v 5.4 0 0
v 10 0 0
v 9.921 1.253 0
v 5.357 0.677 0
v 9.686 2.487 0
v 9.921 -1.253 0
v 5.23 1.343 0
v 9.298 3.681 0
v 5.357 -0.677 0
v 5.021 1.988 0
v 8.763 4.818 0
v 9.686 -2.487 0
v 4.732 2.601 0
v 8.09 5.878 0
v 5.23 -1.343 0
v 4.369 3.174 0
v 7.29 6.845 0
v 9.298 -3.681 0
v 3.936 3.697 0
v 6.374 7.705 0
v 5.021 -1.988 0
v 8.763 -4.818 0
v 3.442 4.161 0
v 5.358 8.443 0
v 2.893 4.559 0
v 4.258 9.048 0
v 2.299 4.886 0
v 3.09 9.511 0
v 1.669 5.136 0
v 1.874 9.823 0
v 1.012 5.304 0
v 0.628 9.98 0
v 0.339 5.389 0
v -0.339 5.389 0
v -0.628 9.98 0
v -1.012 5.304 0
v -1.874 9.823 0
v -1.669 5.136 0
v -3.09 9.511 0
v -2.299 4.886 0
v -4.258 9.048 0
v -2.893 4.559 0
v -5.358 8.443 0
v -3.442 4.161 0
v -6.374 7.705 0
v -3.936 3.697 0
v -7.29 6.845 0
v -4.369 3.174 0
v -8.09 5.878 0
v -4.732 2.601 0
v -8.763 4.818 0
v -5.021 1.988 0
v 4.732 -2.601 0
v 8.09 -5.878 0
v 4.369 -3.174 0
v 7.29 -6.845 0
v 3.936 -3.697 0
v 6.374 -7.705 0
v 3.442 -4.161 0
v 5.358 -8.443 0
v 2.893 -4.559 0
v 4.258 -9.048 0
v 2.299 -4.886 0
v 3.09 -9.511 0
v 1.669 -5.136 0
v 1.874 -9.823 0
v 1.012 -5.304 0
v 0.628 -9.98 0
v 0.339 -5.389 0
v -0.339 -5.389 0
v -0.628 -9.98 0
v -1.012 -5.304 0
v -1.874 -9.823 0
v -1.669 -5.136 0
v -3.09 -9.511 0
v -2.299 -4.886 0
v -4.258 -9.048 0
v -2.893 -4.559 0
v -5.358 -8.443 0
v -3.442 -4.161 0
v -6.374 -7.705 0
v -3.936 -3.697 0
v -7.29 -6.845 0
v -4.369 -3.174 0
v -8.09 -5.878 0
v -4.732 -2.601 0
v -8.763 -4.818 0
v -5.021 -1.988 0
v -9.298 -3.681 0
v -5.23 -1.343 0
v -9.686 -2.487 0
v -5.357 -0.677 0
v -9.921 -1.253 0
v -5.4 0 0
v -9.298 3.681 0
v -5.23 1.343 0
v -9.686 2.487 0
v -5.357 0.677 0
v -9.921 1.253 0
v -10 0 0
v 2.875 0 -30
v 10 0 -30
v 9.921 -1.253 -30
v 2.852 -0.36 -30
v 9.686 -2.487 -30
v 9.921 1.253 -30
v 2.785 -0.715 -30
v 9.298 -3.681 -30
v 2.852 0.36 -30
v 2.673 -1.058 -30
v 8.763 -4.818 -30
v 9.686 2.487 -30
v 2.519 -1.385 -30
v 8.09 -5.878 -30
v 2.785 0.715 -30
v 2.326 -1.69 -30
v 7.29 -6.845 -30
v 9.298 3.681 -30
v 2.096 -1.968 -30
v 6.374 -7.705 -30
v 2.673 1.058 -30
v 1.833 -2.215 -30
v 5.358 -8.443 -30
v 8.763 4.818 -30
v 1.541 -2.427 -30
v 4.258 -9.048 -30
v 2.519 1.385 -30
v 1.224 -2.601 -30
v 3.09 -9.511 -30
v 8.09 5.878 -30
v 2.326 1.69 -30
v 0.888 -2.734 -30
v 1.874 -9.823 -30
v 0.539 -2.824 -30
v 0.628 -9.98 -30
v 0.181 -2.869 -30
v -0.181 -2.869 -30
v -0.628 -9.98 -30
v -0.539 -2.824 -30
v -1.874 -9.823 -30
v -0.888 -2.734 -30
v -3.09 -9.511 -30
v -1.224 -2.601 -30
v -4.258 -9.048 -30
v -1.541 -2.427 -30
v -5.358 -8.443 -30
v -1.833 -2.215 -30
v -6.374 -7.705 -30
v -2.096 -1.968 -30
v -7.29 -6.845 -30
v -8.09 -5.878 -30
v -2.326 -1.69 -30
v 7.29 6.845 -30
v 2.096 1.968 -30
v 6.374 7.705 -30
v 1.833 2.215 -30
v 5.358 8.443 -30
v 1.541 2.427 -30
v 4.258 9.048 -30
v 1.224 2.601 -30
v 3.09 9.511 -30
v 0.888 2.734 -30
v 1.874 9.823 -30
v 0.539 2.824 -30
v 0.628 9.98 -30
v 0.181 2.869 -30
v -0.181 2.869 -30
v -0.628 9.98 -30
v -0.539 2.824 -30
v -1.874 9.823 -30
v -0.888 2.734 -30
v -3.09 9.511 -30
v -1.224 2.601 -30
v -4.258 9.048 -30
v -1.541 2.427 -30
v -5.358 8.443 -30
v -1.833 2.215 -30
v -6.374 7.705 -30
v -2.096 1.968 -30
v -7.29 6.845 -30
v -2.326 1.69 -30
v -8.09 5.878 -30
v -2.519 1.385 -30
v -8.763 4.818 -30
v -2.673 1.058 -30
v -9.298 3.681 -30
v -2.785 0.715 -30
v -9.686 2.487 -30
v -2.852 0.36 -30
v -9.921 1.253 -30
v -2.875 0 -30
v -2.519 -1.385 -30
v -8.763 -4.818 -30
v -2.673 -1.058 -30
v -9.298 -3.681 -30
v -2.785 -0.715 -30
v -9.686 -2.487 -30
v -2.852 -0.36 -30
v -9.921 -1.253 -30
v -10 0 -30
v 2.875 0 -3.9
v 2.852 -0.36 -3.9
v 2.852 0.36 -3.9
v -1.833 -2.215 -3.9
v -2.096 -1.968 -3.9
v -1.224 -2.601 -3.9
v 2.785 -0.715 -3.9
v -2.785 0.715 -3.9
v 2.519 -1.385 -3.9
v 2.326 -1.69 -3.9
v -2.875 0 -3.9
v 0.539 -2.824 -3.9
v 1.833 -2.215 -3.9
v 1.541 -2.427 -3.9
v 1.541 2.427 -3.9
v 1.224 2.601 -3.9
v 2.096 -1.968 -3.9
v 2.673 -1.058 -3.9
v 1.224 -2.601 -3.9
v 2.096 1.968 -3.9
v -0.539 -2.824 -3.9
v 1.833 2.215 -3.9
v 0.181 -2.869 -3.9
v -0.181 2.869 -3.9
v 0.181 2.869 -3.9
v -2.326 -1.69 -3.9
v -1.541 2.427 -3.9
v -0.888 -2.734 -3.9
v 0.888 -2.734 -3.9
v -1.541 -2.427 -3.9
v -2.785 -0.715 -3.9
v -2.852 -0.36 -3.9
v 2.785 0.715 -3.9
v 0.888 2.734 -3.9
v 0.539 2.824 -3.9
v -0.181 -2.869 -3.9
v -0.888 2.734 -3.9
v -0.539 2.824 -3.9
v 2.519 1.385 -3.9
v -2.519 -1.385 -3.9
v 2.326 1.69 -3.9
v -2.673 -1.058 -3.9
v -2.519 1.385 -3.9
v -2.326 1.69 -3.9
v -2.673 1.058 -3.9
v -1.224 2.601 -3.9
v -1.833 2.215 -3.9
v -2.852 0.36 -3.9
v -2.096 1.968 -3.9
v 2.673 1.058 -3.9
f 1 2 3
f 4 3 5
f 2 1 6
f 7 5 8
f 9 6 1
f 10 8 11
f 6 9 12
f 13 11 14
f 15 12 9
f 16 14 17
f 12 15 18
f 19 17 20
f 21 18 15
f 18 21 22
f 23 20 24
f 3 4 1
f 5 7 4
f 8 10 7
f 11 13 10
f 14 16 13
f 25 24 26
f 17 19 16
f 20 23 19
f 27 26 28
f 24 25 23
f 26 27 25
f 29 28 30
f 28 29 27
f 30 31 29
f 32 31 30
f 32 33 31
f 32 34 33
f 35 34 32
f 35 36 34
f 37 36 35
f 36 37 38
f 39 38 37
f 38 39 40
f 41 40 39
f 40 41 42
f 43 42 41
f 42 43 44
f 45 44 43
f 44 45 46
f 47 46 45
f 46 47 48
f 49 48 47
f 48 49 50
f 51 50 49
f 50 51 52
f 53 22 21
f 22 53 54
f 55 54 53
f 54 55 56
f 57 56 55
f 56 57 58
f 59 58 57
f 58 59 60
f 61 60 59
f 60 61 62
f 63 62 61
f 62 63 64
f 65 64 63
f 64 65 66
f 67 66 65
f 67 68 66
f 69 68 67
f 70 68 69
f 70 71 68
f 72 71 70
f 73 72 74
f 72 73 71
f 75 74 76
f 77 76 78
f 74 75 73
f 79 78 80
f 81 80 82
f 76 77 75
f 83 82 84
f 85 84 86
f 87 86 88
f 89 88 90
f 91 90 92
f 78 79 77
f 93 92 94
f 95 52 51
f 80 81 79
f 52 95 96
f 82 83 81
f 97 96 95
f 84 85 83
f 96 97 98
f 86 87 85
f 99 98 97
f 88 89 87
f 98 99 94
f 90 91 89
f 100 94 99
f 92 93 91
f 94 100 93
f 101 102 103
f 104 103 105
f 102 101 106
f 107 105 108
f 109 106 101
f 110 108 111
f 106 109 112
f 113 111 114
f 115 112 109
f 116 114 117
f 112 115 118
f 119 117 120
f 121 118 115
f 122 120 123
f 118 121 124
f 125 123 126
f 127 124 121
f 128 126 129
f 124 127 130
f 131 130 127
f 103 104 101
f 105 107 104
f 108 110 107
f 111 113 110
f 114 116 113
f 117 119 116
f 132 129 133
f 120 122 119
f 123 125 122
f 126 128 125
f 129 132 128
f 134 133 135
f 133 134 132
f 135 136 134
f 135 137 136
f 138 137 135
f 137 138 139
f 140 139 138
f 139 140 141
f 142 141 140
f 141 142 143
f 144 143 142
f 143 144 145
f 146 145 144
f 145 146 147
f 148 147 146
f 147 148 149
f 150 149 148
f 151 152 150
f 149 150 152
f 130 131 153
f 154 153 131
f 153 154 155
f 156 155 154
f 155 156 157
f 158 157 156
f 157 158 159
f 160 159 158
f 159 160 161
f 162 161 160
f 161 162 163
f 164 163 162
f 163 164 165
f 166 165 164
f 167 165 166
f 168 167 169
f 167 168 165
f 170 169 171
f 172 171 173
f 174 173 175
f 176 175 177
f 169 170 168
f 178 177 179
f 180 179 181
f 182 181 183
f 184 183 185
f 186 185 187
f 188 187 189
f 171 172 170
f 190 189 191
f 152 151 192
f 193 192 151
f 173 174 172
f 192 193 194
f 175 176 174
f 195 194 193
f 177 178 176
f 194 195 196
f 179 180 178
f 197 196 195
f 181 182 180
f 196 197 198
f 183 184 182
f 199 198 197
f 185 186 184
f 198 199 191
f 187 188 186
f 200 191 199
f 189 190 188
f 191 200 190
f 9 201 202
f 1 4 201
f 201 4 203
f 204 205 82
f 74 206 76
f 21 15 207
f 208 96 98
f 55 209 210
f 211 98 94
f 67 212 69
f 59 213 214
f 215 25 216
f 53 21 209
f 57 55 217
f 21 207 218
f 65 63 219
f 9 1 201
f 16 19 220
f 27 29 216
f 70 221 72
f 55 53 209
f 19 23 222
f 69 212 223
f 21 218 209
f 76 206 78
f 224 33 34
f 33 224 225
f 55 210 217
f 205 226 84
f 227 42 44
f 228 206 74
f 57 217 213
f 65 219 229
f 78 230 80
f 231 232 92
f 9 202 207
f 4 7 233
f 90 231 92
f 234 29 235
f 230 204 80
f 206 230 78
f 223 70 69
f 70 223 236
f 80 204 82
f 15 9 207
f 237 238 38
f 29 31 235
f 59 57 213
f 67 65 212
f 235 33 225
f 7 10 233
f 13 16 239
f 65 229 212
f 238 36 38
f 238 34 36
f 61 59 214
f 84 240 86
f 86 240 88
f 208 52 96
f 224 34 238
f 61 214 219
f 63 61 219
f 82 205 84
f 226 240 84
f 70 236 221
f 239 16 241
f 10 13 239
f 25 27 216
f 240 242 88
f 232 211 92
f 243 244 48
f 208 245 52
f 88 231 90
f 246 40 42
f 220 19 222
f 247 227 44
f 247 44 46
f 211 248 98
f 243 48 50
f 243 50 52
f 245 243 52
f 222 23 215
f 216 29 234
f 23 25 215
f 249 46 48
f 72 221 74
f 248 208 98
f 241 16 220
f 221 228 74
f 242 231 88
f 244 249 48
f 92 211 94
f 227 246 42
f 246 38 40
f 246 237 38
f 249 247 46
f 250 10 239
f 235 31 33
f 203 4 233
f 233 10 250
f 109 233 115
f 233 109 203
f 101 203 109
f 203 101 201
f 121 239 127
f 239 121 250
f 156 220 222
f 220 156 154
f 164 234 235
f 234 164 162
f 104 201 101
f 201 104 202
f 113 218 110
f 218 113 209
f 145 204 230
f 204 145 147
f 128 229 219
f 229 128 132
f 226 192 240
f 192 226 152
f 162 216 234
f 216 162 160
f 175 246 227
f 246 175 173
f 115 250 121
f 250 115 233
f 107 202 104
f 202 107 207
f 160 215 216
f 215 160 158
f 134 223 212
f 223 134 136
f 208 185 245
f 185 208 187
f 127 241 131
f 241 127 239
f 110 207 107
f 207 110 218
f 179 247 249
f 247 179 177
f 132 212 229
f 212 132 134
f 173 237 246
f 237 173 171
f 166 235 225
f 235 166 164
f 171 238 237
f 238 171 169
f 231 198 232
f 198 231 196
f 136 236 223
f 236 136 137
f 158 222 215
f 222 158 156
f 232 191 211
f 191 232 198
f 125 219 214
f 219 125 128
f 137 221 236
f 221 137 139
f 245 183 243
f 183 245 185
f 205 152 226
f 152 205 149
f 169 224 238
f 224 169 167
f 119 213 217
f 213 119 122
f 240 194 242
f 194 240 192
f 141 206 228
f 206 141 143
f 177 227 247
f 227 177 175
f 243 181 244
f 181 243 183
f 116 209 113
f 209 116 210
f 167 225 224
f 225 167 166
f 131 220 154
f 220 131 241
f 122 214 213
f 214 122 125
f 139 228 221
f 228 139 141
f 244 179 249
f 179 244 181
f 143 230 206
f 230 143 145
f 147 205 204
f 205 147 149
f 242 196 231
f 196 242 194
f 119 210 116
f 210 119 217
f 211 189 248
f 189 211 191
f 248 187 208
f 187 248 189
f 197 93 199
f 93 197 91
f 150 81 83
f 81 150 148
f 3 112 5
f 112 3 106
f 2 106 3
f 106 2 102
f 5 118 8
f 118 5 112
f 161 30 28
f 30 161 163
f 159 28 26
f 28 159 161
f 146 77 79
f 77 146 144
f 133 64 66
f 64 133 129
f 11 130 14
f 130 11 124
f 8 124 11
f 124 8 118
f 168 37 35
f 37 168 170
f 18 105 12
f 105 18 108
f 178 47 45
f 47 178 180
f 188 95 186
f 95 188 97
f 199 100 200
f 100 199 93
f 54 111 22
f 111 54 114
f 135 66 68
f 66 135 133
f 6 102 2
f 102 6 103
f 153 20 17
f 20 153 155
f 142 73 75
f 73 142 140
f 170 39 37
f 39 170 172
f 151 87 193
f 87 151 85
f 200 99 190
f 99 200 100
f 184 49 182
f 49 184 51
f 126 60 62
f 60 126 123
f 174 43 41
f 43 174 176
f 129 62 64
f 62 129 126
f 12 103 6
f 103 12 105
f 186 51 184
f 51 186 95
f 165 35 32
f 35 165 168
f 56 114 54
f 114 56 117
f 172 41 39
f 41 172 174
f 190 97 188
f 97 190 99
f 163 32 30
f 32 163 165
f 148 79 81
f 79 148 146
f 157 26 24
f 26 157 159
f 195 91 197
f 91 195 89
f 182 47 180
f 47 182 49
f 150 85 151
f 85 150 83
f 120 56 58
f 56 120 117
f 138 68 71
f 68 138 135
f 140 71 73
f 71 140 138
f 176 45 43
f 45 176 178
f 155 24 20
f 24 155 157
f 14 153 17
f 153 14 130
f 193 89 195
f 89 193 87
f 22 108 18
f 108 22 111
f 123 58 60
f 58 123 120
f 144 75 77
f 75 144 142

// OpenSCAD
$fn = 50;


difference() {
	union() {
		translate(v = [0, 0, -30.0000000000]) {
			cylinder(h = 30, r = 10.0000000000);
		}
		cylinder(h = 0, r = 16.0000000000);
	}
	union() {
		translate(v = [0, 0, 0]) {
			rotate(a = [0, 0, 0]) {
				difference() {
					union() {
						#translate(v = [0, 0, -30.0000000000]) {
							cylinder(h = 30, r = 2.6000000000);
						}
						#translate(v = [0, 0, -3.9000000000]) {
							cylinder(h = 3.9000000000, r1 = 2.8750000000, r2 = 5.4000000000);
						}
						#translate(v = [0, 0, -30.0000000000]) {
							cylinder(h = 30, r = 2.8750000000);
						}
						#translate(v = [0, 0, -30.0000000000]) {
							cylinder(h = 30, r = 2.6000000000);
						}
					}
					union();
				}
			}
		}
	}
}
